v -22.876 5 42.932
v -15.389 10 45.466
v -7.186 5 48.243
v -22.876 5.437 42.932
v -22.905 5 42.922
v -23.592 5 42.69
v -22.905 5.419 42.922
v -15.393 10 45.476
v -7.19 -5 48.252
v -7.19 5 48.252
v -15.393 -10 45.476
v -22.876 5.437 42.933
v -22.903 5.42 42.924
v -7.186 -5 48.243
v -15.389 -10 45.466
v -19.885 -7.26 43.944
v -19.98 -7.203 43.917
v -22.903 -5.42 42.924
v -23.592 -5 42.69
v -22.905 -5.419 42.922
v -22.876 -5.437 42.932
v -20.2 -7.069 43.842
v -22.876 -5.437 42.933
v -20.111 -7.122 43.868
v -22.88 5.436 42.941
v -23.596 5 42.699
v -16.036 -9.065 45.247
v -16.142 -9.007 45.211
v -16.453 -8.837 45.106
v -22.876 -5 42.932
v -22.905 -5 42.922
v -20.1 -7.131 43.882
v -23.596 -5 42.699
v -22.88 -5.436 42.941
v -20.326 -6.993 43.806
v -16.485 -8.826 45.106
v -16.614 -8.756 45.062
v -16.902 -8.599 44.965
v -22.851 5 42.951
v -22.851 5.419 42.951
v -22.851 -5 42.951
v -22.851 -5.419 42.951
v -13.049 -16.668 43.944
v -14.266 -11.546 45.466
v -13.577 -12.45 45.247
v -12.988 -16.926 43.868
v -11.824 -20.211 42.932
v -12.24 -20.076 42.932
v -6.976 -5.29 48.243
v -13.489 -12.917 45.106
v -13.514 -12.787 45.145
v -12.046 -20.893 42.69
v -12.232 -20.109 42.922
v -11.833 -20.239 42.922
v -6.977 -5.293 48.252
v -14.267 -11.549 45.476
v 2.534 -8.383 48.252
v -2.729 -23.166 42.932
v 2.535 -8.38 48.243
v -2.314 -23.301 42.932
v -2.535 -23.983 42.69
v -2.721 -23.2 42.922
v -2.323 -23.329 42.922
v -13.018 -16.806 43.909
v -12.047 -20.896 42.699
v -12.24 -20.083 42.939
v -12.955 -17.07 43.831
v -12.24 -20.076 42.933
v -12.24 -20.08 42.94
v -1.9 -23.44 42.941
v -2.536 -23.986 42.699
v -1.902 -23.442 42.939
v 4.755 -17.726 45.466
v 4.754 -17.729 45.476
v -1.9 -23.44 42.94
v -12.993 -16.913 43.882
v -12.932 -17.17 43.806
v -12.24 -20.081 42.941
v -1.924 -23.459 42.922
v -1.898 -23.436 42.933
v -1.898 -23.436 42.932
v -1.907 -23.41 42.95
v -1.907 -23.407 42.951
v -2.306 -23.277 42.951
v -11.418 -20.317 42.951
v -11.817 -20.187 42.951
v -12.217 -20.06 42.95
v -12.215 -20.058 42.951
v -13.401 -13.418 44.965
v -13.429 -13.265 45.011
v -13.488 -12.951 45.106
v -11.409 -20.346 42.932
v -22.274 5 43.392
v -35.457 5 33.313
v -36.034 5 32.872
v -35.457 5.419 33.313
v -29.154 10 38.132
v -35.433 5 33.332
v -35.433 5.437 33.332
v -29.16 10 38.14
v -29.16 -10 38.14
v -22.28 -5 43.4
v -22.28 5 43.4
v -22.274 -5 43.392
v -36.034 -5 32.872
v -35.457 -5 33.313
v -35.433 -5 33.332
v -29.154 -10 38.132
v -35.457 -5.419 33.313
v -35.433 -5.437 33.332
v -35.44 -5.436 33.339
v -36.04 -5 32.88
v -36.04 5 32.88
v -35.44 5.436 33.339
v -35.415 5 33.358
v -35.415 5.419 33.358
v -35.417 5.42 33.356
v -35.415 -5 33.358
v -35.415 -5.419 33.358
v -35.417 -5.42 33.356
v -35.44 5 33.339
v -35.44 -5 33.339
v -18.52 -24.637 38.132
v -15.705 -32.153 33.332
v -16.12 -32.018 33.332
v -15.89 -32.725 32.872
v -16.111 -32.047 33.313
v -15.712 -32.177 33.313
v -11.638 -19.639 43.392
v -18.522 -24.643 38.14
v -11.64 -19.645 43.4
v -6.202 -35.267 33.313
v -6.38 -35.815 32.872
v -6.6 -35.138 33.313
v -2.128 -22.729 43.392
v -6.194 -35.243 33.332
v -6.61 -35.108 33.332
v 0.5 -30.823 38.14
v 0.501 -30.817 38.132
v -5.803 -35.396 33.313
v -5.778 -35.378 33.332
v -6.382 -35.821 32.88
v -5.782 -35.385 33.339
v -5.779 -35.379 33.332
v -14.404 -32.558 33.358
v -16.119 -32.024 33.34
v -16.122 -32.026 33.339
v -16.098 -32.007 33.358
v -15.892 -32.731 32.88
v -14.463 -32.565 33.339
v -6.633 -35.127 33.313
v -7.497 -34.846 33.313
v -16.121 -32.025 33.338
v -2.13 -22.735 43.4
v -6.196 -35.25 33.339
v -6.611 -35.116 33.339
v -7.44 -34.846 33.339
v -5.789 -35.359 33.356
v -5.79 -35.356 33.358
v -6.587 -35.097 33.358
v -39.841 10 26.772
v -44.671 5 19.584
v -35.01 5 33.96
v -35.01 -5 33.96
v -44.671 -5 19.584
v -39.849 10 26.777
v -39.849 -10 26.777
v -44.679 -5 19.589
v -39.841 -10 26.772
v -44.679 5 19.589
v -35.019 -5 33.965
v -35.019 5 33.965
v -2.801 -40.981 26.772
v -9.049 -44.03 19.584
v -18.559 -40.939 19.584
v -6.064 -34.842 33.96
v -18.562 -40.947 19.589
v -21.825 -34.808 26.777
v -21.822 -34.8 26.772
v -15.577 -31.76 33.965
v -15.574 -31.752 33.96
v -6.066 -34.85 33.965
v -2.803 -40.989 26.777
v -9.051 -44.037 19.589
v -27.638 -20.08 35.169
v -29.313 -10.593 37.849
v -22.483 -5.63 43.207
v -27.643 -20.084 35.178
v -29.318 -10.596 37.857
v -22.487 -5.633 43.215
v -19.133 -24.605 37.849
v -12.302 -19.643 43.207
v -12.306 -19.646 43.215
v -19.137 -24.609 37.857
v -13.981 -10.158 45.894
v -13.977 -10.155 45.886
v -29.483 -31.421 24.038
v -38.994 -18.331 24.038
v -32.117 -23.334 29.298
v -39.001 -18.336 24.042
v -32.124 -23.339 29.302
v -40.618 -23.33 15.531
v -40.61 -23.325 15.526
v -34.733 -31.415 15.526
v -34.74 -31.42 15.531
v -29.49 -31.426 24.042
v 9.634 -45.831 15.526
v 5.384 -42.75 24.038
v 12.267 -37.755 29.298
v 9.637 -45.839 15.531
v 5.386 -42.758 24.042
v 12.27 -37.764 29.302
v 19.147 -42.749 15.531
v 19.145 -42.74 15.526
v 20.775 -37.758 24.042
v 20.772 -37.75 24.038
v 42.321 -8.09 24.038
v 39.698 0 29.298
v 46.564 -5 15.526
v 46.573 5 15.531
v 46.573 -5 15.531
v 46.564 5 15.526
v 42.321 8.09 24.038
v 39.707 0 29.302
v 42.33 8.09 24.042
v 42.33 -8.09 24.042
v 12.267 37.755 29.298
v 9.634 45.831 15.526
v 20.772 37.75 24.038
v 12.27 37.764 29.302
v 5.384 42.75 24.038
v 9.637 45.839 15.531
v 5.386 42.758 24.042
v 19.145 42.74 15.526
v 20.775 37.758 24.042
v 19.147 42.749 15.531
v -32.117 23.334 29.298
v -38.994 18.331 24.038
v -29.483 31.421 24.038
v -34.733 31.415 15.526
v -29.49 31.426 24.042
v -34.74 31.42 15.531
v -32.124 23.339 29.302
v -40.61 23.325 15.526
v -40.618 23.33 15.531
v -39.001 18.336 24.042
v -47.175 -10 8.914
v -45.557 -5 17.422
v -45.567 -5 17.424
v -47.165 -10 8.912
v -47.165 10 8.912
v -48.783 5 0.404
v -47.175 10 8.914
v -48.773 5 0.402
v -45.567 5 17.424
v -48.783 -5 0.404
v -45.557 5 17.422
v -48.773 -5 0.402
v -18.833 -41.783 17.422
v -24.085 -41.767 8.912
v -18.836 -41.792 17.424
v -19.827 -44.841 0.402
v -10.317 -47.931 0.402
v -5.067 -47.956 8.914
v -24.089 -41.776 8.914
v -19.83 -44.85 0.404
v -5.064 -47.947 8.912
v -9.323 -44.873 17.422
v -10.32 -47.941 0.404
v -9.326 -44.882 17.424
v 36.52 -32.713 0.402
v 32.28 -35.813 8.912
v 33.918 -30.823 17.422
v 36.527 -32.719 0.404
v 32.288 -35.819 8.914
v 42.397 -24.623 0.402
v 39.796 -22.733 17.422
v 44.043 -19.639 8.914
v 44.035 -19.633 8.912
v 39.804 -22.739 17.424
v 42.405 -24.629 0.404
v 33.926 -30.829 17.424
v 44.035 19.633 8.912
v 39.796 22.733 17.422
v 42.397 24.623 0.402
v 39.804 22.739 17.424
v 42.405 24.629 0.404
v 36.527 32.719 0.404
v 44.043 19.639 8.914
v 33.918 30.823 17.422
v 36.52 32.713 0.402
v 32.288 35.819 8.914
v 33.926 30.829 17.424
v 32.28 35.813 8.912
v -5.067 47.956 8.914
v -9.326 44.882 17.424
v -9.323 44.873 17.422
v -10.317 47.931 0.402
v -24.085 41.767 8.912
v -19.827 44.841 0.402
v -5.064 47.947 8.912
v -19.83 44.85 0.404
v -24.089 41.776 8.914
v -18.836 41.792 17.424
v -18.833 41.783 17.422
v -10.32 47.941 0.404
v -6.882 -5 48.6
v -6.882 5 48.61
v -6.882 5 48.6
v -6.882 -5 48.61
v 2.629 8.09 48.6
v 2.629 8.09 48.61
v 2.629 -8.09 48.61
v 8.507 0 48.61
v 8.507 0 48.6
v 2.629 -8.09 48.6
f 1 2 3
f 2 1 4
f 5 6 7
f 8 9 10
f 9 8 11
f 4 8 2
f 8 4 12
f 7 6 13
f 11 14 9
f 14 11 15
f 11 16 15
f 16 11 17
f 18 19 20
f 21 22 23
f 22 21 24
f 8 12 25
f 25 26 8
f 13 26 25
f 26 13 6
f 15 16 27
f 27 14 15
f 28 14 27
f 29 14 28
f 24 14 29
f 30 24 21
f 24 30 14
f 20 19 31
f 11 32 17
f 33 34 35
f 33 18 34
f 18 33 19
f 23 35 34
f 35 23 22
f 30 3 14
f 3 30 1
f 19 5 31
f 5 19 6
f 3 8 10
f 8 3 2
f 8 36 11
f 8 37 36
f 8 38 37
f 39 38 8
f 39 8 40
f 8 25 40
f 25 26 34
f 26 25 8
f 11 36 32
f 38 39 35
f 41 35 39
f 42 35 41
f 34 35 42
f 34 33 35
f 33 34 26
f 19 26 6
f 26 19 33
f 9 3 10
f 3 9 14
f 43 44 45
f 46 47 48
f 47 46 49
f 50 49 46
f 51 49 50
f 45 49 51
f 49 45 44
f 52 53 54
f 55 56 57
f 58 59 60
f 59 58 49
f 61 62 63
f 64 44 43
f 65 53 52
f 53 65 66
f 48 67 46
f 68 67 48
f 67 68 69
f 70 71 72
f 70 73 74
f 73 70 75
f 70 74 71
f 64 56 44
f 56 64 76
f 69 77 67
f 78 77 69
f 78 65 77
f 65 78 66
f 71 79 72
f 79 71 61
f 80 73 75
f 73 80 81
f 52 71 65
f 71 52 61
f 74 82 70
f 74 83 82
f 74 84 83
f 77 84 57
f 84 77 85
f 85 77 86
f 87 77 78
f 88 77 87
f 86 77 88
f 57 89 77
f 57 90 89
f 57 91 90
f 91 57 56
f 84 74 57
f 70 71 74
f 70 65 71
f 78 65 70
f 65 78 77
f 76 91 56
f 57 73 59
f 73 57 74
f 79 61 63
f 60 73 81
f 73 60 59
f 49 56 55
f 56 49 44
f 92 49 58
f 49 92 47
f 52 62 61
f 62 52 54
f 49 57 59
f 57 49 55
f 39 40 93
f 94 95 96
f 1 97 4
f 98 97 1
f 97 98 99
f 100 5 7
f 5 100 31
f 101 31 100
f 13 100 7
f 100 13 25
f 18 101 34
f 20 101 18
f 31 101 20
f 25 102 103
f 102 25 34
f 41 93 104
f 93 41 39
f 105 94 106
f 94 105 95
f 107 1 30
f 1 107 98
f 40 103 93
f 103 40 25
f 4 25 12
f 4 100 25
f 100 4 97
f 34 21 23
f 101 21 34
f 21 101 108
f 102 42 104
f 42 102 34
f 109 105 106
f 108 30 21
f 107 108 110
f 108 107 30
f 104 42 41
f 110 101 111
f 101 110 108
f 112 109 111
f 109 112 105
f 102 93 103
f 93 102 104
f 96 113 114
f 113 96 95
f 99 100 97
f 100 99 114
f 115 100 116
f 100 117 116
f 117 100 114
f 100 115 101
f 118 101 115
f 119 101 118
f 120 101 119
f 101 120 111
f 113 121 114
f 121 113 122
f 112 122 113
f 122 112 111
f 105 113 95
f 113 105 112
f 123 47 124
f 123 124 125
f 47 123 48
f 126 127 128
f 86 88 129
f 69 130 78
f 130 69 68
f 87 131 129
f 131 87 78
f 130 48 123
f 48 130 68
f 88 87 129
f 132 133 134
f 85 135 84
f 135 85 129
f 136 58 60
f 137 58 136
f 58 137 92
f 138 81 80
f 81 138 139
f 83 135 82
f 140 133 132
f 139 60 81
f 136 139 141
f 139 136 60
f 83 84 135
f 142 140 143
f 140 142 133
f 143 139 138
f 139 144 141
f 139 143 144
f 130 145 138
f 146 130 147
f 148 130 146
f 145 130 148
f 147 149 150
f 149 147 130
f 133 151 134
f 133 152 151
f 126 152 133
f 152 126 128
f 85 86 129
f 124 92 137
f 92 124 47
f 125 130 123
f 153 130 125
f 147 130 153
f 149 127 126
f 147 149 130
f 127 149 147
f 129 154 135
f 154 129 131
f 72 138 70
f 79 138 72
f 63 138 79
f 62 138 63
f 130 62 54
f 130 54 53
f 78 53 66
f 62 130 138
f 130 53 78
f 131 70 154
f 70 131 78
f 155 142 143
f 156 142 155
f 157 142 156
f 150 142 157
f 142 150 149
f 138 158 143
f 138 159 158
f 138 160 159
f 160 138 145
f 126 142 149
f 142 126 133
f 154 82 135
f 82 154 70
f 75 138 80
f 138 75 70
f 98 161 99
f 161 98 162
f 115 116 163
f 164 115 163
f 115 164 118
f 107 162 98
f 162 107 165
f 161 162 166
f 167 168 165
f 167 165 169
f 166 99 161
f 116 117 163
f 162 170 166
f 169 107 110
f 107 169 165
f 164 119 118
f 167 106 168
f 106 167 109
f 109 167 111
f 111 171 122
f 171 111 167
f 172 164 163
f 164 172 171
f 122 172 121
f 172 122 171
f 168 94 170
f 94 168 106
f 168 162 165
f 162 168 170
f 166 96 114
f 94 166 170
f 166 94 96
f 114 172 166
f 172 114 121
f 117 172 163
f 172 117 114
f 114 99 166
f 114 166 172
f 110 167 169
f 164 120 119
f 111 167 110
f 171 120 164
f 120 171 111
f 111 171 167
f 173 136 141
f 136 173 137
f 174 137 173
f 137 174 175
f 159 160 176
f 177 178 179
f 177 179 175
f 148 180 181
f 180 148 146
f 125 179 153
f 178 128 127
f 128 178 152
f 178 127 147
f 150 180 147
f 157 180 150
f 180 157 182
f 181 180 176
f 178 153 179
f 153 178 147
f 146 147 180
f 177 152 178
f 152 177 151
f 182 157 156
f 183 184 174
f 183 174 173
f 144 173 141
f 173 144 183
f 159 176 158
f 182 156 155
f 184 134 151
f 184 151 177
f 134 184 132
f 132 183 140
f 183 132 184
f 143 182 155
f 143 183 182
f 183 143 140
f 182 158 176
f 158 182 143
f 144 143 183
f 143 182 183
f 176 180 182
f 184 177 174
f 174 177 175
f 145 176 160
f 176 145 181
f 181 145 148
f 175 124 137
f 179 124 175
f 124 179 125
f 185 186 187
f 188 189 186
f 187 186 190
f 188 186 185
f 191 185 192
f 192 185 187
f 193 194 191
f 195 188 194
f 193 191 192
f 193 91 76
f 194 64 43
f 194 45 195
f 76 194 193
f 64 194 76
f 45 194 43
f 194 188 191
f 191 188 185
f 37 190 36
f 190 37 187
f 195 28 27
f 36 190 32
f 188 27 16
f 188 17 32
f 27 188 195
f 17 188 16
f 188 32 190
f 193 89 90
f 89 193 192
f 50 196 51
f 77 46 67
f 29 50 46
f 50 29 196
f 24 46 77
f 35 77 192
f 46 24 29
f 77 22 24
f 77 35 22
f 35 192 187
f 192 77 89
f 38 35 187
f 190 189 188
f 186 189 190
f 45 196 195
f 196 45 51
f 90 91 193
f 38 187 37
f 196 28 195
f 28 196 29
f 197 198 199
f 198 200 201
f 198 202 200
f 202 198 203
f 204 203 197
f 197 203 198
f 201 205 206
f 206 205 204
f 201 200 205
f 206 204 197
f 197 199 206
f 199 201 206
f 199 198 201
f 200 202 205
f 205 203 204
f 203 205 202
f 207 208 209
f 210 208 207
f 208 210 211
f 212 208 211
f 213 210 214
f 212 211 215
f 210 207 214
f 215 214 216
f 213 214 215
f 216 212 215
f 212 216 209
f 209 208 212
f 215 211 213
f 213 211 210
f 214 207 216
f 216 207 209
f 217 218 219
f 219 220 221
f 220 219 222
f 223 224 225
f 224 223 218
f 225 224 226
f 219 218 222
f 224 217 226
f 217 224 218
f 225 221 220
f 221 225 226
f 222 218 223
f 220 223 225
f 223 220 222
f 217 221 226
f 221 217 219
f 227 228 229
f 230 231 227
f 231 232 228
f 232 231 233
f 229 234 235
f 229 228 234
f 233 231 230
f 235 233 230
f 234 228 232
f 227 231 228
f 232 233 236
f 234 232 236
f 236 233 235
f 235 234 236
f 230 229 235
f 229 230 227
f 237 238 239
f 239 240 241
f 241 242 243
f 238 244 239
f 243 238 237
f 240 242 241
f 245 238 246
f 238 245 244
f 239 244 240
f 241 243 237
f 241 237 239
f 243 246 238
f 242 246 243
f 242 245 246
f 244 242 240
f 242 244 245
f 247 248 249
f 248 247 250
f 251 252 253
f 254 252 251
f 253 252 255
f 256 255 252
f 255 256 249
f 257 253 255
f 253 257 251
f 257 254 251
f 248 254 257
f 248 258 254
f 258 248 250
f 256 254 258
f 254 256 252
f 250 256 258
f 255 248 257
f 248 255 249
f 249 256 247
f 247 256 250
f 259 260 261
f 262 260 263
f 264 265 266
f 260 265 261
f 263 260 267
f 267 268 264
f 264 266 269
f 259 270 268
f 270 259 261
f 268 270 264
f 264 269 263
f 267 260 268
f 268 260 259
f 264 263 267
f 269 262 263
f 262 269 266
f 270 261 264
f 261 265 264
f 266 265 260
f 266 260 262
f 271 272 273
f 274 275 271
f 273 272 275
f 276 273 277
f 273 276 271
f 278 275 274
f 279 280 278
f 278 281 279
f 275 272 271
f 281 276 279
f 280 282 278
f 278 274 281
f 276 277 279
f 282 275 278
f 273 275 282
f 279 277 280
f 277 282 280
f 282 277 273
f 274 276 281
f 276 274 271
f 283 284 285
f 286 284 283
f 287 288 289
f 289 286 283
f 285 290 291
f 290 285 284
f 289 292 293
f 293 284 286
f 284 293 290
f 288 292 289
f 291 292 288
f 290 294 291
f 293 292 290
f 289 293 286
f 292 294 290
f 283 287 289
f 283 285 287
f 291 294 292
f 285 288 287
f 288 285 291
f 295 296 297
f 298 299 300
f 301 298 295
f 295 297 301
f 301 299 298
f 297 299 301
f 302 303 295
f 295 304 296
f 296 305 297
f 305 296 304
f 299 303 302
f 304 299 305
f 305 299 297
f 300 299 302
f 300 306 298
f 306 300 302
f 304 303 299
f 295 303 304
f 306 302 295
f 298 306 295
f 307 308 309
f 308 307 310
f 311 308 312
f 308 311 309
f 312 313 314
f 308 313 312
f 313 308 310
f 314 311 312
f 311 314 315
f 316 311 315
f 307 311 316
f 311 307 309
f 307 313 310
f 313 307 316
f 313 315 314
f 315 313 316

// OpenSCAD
// manual build of ball with one subdivision of hex tiles
// params to tweak
thick=.01;
side = 10;
shell_thick = 2;
shell_dr = 4;

// https://en.wikipedia.org/wiki/Goldberg_polyhedron#Class_I


// empirical constants (would be great to have exact formulas)
coeff_side_r = 2.4*2;     // ratio between polygon side and final radius
coeff_pent_delta_side = 0.06;
ang1 = 37.4;
ang2 = 11.3;
ang3 = 4.5;

// derived values
pent_a = 180 / 5;
hex_a = 180 / 6;
pent_r = side / (2*sin(pent_a));
hex_r = side / (2*sin(hex_a));

radius = side * coeff_side_r;
pent_delta = side * coeff_pent_delta_side;

// https://math.stackexchange.com/questions/2029958/numbering-a-spherical-grid-of-pentagons-and-hexagons-so-neighbours-are-easily

// https://www.americanscientist.org/article/the-topology-and-combinatorics-of-soccer-balls#:~:text=Twelve%20pentagons%20and%2020%20hexagons,as%20the%20standard%20soccer%20ball.


module hex_tile(side = side, thick=thick, tile_a=0) {
    angles = [for (i = [0:5]) 30 + i*(2*hex_a)];
    coords = [for (th=angles) [hex_r * cos(th), hex_r * sin(th)]];
    rotate([0, 0, tile_a])
    linear_extrude(thick)
        polygon(coords);
}


module pent_tile(side = side, thick=thick, tile_a=0) {
    angles = [for (i = [0:4]) i*(2*pent_a)];
    coords = [for (th=angles) [pent_r * cos(th), pent_r * sin(th)]];
    color("lightblue")
    rotate([0, 0, tile_a])
    linear_extrude(thick)
        polygon(coords);
}


module top_triag() {
    for (layer = [0:2]) {
        for (i = [0:1]) {
            rotate([0, -ang1/2 - layer*ang1/2, i*pent_a*2])
            translate([0, 0, radius])
                hex_tile();
        }
        
        if (layer > 0) {
            for (i = [1:layer]) {
                rotate([0, -ang1+5, pent_a])
                translate([0, 0, radius])
                    hex_tile(tile_a=hex_a);
            }
        }
    }
}


module ball() {
    // center
    translate([0, 0, radius+pent_delta])
        pent_tile();
    mirror([0, 0, 1])
    translate([0, 0, radius+pent_delta])
;//        pent_tile(tile_a=pent_a);

    // layer 1
    top_triag();
    rotate([0, -ang1+5, pent_a])
    translate([0, 0, radius])
;//        hex_tile(tile_a=hex_a);
    
    
    for (i = [0:4]) {
        rotate([0, -ang1, i*pent_a*2])
        translate([0, 0, radius])
;//            hex_tile();

        mirror([0, 0, 1])
        rotate([0, ang1, i*pent_a*2])
        translate([0, 0, radius])
;//            hex_tile();
    }    

    // center 2
    for (i = [1:2:9]) {
        rotate([0, -ang1*2+ang2, i*pent_a])
        translate([0, 0, radius+pent_delta])
            pent_tile();
        mirror([0, 0, 1])
        rotate([0, -ang1*2+ang2, (i-1)*pent_a])
        translate([0, 0, radius+pent_delta])
;//            pent_tile();
    }

    // layer 2
    for (i = [1:2:9]) {
        rotate([0, -ang1*2-ang3, pent_a*(i-1)])
        translate([0, 0, radius])
            hex_tile();
        mirror([0, 0, 1])
        rotate([0, -ang1*2-ang3, pent_a*i])
        translate([0, 0, radius])
;//            hex_tile();
    }
}


module shell(dr=shell_dr) {
    difference() {
        sphere(radius + dr, $fn=100);
        sphere(radius + dr - shell_thick, $fn=100);
    }
}


module diff_shell() {
    difference() {
        shell();
        ball();
    }
}


ball();
//diff_shell();
